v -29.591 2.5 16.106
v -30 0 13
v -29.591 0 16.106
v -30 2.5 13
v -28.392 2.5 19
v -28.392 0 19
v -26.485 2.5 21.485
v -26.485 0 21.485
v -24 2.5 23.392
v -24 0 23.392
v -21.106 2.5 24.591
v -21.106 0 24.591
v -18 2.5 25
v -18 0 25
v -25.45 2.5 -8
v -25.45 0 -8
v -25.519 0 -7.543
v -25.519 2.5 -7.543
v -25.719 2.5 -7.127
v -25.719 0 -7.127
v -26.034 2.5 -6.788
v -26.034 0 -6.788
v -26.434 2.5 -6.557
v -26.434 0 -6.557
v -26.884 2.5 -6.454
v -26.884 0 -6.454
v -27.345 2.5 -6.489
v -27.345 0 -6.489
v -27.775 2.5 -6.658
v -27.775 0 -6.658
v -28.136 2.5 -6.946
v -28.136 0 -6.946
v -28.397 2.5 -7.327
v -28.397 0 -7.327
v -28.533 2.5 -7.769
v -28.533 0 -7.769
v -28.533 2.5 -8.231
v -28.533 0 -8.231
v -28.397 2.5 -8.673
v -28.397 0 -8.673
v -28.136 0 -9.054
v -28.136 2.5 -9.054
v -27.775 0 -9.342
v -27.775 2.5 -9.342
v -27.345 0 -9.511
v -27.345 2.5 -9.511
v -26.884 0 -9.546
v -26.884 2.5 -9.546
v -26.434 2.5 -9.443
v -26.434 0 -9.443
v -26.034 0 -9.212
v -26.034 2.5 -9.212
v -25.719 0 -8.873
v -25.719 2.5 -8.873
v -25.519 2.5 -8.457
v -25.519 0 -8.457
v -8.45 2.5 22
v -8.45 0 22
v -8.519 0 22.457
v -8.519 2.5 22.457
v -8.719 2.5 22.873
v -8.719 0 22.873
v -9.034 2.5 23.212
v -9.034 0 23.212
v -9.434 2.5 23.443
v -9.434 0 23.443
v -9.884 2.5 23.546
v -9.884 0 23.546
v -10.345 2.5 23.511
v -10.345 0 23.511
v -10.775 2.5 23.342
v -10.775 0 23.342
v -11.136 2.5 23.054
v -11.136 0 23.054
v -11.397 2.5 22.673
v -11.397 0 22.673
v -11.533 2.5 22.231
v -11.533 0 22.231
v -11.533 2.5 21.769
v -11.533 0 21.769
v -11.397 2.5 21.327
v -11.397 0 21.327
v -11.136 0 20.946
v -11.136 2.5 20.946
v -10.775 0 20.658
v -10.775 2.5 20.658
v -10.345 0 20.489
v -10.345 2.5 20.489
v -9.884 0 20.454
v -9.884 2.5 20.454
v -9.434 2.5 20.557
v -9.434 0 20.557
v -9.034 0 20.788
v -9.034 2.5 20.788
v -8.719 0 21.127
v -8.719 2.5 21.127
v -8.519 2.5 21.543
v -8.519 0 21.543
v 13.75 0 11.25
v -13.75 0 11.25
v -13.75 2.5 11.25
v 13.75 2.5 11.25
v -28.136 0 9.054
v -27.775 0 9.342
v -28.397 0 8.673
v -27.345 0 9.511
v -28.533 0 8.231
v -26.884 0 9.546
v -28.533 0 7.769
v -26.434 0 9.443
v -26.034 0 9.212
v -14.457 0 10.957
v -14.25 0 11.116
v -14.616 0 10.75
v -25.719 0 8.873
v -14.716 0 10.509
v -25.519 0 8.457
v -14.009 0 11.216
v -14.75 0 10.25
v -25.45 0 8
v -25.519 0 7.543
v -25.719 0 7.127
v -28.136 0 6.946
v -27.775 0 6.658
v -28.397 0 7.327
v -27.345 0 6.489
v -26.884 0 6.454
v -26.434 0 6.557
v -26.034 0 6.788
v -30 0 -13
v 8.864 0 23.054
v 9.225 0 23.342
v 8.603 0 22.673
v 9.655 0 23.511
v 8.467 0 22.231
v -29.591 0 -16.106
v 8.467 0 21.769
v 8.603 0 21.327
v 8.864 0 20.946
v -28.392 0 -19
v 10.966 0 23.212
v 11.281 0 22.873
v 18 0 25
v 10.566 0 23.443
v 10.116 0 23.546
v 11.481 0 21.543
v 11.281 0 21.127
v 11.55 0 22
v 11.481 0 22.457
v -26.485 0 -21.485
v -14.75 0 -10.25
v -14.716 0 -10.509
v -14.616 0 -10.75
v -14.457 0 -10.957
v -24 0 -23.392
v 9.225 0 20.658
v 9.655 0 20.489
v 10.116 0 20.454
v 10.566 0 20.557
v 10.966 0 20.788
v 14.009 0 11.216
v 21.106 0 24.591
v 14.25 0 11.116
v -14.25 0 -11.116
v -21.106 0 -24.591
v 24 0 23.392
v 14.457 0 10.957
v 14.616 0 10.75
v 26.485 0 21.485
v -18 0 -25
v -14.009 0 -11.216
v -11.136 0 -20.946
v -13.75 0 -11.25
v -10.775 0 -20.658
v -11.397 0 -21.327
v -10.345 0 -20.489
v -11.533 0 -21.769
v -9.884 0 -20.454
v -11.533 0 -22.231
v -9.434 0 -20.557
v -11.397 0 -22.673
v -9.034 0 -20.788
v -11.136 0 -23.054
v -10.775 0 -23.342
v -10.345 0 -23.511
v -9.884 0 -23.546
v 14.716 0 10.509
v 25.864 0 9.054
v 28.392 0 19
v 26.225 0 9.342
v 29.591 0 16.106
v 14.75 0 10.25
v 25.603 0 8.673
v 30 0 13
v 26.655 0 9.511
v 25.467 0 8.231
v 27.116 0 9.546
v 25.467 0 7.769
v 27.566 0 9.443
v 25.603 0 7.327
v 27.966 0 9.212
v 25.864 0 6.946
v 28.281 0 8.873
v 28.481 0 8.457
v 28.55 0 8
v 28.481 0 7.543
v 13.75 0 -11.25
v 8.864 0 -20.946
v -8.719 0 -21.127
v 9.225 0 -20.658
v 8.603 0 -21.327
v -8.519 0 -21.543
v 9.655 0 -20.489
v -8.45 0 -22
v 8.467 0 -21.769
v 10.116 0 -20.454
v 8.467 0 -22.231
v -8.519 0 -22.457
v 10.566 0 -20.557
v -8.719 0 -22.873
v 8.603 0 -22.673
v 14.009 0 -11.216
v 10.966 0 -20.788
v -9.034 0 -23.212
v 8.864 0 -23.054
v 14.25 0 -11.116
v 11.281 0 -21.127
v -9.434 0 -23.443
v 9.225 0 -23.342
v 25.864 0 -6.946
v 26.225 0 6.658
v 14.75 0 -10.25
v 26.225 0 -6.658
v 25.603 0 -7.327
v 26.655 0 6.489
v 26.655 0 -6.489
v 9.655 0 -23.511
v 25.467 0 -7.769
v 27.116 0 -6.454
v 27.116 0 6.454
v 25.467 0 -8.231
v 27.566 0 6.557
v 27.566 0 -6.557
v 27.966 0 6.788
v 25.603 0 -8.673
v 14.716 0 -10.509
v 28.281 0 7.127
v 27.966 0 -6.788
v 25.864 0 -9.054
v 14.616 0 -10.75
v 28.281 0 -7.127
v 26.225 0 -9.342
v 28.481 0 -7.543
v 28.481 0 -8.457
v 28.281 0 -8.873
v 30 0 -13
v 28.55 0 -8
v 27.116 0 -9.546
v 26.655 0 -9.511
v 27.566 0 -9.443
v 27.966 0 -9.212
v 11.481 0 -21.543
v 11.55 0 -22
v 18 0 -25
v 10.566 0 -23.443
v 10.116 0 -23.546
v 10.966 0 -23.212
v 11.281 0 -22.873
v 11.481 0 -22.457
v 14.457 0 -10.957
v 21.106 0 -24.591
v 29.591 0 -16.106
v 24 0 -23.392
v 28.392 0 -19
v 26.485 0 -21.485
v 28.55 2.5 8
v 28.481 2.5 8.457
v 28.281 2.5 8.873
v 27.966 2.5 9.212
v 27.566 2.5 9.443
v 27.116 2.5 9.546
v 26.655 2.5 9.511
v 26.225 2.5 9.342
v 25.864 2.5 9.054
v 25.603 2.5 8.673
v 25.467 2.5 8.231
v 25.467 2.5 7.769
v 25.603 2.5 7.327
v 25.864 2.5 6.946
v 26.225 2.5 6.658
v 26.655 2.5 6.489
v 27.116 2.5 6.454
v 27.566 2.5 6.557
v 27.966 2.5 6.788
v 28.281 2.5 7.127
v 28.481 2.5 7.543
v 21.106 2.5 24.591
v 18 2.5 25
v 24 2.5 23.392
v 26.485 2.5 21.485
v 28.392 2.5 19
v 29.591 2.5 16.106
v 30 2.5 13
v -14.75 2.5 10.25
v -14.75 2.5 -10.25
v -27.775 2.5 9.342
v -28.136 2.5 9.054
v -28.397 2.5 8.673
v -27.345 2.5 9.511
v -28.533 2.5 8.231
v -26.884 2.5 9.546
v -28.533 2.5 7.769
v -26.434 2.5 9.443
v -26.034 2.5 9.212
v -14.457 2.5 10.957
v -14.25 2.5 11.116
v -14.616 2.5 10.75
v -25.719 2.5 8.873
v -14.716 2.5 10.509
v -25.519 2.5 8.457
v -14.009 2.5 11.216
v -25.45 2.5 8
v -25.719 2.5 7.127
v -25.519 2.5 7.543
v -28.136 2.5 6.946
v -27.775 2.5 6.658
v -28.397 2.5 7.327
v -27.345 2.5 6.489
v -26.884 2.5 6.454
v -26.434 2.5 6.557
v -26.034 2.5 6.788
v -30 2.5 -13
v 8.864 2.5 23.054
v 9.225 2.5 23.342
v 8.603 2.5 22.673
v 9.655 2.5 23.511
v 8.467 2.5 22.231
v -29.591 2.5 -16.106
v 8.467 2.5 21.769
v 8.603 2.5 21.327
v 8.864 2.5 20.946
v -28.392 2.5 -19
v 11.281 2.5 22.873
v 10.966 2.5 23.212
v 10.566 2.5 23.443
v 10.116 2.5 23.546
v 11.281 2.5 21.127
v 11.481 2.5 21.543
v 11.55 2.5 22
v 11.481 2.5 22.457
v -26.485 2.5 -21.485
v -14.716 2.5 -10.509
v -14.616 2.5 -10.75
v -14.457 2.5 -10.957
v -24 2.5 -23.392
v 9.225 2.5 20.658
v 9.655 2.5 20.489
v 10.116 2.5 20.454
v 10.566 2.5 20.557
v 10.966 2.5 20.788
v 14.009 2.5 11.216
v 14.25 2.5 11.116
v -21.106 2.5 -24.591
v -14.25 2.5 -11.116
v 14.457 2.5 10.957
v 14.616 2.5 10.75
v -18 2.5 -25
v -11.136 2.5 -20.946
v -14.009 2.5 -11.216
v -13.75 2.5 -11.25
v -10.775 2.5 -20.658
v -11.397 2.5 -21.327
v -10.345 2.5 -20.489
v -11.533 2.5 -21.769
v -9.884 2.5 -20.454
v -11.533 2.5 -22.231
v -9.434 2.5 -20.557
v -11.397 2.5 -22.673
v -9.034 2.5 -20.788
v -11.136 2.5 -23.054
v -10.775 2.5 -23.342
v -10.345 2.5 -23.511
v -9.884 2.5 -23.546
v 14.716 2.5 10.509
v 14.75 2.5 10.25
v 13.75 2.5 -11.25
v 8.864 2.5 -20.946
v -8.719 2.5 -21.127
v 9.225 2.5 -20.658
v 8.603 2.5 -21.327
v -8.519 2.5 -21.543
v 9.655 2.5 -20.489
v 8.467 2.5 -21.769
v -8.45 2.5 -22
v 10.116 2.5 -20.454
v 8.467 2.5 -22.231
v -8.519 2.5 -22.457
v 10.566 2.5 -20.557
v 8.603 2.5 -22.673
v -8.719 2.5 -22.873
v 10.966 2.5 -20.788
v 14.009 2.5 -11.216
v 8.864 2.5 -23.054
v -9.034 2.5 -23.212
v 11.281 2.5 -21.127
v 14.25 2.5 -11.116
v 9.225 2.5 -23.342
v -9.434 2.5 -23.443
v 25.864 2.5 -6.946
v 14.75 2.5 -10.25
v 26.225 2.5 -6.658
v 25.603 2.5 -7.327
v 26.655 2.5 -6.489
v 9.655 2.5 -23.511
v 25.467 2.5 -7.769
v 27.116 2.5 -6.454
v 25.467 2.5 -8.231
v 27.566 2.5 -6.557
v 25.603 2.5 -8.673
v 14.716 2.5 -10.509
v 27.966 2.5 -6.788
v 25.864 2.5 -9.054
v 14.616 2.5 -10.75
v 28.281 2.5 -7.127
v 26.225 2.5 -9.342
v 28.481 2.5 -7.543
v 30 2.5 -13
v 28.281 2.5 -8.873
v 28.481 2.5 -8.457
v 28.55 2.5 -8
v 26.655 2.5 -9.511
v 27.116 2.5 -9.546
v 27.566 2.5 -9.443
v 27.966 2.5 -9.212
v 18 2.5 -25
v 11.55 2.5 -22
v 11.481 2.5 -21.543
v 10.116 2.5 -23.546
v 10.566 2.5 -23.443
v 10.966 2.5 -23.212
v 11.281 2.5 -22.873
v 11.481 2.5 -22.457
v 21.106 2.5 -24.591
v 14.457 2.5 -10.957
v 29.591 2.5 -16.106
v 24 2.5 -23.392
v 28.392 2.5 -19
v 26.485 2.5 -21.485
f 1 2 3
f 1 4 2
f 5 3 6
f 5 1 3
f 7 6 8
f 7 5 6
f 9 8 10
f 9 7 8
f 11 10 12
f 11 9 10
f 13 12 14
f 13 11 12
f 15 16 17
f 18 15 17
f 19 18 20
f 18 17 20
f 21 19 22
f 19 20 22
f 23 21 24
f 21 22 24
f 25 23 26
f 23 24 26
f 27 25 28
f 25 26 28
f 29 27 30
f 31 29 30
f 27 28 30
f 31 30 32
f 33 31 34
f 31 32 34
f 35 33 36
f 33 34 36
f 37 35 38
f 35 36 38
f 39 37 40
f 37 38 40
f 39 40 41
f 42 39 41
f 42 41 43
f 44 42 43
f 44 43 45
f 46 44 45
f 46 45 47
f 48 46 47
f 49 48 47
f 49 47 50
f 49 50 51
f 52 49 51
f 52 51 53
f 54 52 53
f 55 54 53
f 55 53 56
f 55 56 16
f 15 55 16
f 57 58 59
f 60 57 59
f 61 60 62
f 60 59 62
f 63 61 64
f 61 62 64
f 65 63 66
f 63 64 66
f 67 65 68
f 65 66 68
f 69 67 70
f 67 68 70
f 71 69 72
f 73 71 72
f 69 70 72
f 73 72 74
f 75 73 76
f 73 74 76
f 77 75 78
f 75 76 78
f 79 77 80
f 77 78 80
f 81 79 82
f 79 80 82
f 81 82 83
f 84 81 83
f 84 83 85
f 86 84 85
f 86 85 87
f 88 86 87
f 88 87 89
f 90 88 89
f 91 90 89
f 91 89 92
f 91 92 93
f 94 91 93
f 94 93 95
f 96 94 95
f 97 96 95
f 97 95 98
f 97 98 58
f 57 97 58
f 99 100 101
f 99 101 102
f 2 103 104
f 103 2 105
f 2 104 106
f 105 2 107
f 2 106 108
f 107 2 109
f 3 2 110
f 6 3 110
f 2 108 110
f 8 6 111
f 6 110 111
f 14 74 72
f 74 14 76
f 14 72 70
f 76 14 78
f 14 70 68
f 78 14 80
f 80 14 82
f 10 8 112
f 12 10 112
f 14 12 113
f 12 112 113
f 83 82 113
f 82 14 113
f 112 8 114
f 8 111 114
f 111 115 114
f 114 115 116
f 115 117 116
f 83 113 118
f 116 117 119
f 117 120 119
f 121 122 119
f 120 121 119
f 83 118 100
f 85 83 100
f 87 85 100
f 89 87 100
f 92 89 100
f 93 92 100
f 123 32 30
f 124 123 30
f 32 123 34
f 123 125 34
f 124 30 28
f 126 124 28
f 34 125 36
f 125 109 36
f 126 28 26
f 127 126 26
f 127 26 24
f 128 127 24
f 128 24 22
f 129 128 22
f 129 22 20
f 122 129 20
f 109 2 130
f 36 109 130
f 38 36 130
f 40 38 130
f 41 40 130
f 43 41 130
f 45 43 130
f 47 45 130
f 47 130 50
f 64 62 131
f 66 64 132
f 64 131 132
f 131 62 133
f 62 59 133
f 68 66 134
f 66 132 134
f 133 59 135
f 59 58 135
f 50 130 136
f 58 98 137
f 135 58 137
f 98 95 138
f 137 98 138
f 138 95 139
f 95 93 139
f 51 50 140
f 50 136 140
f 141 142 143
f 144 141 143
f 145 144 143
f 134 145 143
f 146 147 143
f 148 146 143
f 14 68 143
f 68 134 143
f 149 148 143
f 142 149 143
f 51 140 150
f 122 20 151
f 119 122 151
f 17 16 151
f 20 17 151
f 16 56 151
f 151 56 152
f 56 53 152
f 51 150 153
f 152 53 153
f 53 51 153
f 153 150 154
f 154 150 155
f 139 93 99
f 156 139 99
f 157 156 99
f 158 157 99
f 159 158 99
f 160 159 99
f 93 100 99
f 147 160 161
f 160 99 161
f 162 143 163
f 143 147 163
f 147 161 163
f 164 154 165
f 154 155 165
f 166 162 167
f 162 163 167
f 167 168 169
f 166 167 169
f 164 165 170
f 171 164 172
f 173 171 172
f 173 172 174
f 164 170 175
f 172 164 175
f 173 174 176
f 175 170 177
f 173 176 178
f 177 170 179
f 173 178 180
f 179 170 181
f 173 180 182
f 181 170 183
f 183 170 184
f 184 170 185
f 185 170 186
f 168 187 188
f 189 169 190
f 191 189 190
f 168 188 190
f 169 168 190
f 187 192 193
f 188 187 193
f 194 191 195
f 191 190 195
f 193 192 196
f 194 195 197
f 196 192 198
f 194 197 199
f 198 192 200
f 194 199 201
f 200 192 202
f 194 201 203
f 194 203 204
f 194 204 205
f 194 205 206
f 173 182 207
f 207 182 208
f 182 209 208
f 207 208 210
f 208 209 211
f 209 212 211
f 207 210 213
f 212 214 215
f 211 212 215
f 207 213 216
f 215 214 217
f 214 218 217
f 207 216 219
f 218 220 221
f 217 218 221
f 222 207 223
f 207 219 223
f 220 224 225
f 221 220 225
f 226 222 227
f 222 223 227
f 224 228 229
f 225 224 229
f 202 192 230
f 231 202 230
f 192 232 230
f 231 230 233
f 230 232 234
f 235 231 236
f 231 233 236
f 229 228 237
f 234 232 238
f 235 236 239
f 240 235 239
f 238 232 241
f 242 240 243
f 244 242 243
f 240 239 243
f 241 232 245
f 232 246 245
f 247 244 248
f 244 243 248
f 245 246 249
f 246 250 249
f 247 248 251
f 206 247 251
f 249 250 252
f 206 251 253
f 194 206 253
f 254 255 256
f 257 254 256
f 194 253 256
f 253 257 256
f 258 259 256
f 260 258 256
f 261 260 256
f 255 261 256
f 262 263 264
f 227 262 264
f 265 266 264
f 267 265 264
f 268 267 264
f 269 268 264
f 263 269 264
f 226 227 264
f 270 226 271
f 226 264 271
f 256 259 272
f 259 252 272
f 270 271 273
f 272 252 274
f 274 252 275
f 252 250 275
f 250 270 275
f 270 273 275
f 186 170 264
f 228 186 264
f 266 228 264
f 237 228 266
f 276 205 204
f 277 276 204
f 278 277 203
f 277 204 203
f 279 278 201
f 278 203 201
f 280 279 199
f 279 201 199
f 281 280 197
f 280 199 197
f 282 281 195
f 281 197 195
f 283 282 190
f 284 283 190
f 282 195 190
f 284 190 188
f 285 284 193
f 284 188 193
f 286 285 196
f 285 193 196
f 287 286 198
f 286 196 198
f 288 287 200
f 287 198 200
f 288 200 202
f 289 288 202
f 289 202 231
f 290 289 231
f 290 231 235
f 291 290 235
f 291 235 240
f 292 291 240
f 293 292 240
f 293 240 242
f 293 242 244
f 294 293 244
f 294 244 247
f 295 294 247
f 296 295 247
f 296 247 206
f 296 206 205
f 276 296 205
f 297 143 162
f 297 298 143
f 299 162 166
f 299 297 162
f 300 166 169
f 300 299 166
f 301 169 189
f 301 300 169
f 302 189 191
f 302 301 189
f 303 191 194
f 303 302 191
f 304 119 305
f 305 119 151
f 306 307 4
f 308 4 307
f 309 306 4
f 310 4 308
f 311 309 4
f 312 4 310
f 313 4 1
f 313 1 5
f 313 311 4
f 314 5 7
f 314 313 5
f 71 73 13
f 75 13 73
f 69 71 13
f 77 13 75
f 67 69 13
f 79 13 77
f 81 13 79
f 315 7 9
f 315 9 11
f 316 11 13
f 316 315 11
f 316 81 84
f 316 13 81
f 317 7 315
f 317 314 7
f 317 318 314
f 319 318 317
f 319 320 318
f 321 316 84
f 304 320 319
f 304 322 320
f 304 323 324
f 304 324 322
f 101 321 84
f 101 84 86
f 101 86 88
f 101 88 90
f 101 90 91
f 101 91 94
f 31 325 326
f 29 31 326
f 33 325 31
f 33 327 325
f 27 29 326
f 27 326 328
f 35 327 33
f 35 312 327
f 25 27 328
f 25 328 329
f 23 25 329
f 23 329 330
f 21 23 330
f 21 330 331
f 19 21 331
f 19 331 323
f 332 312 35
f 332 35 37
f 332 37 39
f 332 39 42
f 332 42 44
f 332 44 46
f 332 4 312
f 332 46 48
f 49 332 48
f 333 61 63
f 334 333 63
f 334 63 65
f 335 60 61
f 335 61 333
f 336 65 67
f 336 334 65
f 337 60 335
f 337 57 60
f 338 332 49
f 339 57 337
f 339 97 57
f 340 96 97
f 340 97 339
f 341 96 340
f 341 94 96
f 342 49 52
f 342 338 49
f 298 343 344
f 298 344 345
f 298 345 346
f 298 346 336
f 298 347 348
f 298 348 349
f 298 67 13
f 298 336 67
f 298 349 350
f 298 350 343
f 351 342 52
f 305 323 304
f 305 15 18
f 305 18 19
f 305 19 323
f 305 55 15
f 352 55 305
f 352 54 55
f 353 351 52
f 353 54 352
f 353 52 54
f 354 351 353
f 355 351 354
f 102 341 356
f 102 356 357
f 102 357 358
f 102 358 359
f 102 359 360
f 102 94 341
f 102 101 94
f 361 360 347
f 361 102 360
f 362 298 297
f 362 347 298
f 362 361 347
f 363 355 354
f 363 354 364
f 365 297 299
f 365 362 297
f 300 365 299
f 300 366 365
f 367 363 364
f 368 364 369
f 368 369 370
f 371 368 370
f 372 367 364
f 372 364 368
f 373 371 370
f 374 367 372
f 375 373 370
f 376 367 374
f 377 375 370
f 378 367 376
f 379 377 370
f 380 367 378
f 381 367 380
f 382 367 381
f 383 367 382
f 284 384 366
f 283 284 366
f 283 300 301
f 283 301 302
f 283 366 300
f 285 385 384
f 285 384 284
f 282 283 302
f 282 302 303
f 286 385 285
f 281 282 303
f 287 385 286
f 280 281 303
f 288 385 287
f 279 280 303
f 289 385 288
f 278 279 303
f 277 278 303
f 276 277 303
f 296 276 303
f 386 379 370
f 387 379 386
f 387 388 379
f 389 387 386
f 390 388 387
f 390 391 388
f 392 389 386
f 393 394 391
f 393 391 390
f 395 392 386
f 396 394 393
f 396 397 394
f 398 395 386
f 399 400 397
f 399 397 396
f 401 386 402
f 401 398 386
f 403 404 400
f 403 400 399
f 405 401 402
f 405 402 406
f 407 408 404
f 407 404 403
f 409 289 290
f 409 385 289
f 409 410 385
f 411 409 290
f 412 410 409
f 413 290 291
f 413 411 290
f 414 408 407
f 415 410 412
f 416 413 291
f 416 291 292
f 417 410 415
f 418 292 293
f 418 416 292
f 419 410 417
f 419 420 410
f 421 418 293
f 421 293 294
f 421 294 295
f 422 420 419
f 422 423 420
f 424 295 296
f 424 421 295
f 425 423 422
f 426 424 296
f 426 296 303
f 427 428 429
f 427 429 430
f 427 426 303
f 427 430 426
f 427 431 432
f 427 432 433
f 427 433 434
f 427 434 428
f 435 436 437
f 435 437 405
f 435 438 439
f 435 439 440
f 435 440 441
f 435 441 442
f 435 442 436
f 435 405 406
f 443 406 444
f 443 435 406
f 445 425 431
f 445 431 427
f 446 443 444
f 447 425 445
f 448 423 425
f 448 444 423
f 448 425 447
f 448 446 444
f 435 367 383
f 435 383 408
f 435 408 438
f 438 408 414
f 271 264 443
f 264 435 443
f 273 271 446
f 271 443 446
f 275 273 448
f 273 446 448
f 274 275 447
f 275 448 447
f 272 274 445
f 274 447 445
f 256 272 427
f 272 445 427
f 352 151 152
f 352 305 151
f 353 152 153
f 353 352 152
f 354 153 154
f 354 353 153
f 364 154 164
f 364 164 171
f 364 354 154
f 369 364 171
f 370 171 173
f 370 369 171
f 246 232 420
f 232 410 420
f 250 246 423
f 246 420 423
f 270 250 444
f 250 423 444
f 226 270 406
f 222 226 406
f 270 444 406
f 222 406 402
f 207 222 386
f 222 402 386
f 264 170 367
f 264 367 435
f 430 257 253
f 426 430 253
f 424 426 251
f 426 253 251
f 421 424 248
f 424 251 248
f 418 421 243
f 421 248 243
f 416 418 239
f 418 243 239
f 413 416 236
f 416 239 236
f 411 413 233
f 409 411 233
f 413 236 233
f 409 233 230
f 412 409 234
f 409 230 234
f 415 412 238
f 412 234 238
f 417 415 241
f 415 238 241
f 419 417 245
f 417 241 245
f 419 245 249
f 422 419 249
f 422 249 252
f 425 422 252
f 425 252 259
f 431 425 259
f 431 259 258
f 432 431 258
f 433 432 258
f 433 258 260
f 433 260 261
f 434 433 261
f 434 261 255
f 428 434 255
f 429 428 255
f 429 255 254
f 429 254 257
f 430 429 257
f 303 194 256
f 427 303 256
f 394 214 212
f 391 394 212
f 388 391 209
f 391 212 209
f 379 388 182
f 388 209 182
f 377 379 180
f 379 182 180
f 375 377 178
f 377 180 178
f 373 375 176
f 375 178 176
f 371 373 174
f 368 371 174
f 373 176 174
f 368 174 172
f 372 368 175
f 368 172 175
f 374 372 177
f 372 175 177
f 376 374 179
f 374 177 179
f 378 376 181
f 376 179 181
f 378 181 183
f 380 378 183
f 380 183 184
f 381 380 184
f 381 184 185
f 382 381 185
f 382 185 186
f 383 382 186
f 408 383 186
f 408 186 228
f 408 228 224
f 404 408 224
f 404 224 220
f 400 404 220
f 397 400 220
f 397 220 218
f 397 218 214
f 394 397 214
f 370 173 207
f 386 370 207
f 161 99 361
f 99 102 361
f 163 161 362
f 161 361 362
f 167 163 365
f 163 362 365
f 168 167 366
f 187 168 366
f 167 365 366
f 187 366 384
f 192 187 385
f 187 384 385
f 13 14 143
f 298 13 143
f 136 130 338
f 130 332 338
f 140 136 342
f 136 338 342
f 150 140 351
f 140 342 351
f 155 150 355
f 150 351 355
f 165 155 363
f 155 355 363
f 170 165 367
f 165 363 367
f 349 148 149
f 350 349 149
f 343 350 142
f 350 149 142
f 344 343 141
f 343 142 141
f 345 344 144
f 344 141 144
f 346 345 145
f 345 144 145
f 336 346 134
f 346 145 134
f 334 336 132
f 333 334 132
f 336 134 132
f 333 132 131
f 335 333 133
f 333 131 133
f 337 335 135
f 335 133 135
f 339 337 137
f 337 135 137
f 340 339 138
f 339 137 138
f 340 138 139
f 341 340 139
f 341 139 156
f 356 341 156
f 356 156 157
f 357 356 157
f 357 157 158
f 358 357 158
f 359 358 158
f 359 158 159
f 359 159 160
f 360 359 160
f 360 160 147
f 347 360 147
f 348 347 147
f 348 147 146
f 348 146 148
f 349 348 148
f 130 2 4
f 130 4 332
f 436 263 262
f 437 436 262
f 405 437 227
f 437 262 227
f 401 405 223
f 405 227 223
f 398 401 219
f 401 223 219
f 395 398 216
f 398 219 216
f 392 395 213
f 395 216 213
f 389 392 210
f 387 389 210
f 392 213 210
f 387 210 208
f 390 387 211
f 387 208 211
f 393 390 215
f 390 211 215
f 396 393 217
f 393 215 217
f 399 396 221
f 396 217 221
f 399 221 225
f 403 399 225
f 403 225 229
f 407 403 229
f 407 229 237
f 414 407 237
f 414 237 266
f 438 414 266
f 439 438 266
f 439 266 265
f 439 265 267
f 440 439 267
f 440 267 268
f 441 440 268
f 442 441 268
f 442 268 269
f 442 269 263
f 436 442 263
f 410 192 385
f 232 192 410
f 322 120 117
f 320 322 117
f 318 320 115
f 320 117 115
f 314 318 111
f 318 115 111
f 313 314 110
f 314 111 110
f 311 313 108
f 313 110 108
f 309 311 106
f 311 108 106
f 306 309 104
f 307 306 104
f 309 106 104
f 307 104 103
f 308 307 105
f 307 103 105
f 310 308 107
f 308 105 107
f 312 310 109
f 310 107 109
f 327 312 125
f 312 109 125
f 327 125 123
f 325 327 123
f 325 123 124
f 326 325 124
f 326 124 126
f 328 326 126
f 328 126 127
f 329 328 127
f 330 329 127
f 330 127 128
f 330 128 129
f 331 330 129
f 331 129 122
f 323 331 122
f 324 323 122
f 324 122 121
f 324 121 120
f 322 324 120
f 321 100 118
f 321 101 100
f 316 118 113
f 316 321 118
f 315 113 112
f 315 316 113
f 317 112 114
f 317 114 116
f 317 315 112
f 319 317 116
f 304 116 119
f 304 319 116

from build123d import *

# Parameters (mm, degrees)
SKETCH_1_W          = 60
SKETCH_1_H          = 50
SKETCH_1_W_2        = 29.5
SKETCH_1_H_2        = 22.5
EXTRUDE_1_DEPTH     = 2.5
SKETCH_8_R          = 1.55
CUT_EXTRUDE_2_DEPTH = 10
FILLET_1_R          = 1
FILLET_2_R          = 12


with BuildPart() as part:
    # 草图1 → 凸台-拉伸1 (new body)
    with BuildSketch(Plane(origin=(0, 0, 0), x_dir=(1, 0, 0), z_dir=(0, 1, 0))):
        Rectangle(SKETCH_1_W, SKETCH_1_H)
        Rectangle(SKETCH_1_W_2, SKETCH_1_H_2, mode=Mode.SUBTRACT)
    extrude(amount=EXTRUDE_1_DEPTH)

    # 草图8 → 切除-拉伸2 (cut)
    with BuildSketch(Plane.XZ):
        with Locations((27, 8)):
            Circle(SKETCH_8_R)
        with Locations((10, 22)):
            Circle(SKETCH_8_R)
        with Locations((-10, 22)):
            Circle(SKETCH_8_R)
        with Locations((-27, 8)):
            Circle(SKETCH_8_R)
        with Locations((-27, -8)):
            Circle(SKETCH_8_R)
        with Locations((-10, -22)):
            Circle(SKETCH_8_R)
        with Locations((10, -22)):
            Circle(SKETCH_8_R)
        with Locations((27, -8)):
            Circle(SKETCH_8_R)
    extrude(amount=-CUT_EXTRUDE_2_DEPTH, mode=Mode.SUBTRACT)

    # 圆角1
    fillet_1_edges = [part.edges().sort_by_distance(p)[0] for p in [
        (14.75, 1.25, 11.25),
        (14.75, 1.25, -11.25),
        (-14.75, 1.25, -11.25),
        (-14.75, 1.25, 11.25),
    ]]
    fillet(fillet_1_edges, radius=FILLET_1_R)

    # 圆角2
    fillet_2_edges = [part.edges().sort_by_distance(p)[0] for p in [
        (30, 1.25, 25),
        (-30, 1.25, 25),
        (-30, 1.25, -25),
        (30, 1.25, -25),
    ]]
    fillet(fillet_2_edges, radius=FILLET_2_R)


solid = part.part
